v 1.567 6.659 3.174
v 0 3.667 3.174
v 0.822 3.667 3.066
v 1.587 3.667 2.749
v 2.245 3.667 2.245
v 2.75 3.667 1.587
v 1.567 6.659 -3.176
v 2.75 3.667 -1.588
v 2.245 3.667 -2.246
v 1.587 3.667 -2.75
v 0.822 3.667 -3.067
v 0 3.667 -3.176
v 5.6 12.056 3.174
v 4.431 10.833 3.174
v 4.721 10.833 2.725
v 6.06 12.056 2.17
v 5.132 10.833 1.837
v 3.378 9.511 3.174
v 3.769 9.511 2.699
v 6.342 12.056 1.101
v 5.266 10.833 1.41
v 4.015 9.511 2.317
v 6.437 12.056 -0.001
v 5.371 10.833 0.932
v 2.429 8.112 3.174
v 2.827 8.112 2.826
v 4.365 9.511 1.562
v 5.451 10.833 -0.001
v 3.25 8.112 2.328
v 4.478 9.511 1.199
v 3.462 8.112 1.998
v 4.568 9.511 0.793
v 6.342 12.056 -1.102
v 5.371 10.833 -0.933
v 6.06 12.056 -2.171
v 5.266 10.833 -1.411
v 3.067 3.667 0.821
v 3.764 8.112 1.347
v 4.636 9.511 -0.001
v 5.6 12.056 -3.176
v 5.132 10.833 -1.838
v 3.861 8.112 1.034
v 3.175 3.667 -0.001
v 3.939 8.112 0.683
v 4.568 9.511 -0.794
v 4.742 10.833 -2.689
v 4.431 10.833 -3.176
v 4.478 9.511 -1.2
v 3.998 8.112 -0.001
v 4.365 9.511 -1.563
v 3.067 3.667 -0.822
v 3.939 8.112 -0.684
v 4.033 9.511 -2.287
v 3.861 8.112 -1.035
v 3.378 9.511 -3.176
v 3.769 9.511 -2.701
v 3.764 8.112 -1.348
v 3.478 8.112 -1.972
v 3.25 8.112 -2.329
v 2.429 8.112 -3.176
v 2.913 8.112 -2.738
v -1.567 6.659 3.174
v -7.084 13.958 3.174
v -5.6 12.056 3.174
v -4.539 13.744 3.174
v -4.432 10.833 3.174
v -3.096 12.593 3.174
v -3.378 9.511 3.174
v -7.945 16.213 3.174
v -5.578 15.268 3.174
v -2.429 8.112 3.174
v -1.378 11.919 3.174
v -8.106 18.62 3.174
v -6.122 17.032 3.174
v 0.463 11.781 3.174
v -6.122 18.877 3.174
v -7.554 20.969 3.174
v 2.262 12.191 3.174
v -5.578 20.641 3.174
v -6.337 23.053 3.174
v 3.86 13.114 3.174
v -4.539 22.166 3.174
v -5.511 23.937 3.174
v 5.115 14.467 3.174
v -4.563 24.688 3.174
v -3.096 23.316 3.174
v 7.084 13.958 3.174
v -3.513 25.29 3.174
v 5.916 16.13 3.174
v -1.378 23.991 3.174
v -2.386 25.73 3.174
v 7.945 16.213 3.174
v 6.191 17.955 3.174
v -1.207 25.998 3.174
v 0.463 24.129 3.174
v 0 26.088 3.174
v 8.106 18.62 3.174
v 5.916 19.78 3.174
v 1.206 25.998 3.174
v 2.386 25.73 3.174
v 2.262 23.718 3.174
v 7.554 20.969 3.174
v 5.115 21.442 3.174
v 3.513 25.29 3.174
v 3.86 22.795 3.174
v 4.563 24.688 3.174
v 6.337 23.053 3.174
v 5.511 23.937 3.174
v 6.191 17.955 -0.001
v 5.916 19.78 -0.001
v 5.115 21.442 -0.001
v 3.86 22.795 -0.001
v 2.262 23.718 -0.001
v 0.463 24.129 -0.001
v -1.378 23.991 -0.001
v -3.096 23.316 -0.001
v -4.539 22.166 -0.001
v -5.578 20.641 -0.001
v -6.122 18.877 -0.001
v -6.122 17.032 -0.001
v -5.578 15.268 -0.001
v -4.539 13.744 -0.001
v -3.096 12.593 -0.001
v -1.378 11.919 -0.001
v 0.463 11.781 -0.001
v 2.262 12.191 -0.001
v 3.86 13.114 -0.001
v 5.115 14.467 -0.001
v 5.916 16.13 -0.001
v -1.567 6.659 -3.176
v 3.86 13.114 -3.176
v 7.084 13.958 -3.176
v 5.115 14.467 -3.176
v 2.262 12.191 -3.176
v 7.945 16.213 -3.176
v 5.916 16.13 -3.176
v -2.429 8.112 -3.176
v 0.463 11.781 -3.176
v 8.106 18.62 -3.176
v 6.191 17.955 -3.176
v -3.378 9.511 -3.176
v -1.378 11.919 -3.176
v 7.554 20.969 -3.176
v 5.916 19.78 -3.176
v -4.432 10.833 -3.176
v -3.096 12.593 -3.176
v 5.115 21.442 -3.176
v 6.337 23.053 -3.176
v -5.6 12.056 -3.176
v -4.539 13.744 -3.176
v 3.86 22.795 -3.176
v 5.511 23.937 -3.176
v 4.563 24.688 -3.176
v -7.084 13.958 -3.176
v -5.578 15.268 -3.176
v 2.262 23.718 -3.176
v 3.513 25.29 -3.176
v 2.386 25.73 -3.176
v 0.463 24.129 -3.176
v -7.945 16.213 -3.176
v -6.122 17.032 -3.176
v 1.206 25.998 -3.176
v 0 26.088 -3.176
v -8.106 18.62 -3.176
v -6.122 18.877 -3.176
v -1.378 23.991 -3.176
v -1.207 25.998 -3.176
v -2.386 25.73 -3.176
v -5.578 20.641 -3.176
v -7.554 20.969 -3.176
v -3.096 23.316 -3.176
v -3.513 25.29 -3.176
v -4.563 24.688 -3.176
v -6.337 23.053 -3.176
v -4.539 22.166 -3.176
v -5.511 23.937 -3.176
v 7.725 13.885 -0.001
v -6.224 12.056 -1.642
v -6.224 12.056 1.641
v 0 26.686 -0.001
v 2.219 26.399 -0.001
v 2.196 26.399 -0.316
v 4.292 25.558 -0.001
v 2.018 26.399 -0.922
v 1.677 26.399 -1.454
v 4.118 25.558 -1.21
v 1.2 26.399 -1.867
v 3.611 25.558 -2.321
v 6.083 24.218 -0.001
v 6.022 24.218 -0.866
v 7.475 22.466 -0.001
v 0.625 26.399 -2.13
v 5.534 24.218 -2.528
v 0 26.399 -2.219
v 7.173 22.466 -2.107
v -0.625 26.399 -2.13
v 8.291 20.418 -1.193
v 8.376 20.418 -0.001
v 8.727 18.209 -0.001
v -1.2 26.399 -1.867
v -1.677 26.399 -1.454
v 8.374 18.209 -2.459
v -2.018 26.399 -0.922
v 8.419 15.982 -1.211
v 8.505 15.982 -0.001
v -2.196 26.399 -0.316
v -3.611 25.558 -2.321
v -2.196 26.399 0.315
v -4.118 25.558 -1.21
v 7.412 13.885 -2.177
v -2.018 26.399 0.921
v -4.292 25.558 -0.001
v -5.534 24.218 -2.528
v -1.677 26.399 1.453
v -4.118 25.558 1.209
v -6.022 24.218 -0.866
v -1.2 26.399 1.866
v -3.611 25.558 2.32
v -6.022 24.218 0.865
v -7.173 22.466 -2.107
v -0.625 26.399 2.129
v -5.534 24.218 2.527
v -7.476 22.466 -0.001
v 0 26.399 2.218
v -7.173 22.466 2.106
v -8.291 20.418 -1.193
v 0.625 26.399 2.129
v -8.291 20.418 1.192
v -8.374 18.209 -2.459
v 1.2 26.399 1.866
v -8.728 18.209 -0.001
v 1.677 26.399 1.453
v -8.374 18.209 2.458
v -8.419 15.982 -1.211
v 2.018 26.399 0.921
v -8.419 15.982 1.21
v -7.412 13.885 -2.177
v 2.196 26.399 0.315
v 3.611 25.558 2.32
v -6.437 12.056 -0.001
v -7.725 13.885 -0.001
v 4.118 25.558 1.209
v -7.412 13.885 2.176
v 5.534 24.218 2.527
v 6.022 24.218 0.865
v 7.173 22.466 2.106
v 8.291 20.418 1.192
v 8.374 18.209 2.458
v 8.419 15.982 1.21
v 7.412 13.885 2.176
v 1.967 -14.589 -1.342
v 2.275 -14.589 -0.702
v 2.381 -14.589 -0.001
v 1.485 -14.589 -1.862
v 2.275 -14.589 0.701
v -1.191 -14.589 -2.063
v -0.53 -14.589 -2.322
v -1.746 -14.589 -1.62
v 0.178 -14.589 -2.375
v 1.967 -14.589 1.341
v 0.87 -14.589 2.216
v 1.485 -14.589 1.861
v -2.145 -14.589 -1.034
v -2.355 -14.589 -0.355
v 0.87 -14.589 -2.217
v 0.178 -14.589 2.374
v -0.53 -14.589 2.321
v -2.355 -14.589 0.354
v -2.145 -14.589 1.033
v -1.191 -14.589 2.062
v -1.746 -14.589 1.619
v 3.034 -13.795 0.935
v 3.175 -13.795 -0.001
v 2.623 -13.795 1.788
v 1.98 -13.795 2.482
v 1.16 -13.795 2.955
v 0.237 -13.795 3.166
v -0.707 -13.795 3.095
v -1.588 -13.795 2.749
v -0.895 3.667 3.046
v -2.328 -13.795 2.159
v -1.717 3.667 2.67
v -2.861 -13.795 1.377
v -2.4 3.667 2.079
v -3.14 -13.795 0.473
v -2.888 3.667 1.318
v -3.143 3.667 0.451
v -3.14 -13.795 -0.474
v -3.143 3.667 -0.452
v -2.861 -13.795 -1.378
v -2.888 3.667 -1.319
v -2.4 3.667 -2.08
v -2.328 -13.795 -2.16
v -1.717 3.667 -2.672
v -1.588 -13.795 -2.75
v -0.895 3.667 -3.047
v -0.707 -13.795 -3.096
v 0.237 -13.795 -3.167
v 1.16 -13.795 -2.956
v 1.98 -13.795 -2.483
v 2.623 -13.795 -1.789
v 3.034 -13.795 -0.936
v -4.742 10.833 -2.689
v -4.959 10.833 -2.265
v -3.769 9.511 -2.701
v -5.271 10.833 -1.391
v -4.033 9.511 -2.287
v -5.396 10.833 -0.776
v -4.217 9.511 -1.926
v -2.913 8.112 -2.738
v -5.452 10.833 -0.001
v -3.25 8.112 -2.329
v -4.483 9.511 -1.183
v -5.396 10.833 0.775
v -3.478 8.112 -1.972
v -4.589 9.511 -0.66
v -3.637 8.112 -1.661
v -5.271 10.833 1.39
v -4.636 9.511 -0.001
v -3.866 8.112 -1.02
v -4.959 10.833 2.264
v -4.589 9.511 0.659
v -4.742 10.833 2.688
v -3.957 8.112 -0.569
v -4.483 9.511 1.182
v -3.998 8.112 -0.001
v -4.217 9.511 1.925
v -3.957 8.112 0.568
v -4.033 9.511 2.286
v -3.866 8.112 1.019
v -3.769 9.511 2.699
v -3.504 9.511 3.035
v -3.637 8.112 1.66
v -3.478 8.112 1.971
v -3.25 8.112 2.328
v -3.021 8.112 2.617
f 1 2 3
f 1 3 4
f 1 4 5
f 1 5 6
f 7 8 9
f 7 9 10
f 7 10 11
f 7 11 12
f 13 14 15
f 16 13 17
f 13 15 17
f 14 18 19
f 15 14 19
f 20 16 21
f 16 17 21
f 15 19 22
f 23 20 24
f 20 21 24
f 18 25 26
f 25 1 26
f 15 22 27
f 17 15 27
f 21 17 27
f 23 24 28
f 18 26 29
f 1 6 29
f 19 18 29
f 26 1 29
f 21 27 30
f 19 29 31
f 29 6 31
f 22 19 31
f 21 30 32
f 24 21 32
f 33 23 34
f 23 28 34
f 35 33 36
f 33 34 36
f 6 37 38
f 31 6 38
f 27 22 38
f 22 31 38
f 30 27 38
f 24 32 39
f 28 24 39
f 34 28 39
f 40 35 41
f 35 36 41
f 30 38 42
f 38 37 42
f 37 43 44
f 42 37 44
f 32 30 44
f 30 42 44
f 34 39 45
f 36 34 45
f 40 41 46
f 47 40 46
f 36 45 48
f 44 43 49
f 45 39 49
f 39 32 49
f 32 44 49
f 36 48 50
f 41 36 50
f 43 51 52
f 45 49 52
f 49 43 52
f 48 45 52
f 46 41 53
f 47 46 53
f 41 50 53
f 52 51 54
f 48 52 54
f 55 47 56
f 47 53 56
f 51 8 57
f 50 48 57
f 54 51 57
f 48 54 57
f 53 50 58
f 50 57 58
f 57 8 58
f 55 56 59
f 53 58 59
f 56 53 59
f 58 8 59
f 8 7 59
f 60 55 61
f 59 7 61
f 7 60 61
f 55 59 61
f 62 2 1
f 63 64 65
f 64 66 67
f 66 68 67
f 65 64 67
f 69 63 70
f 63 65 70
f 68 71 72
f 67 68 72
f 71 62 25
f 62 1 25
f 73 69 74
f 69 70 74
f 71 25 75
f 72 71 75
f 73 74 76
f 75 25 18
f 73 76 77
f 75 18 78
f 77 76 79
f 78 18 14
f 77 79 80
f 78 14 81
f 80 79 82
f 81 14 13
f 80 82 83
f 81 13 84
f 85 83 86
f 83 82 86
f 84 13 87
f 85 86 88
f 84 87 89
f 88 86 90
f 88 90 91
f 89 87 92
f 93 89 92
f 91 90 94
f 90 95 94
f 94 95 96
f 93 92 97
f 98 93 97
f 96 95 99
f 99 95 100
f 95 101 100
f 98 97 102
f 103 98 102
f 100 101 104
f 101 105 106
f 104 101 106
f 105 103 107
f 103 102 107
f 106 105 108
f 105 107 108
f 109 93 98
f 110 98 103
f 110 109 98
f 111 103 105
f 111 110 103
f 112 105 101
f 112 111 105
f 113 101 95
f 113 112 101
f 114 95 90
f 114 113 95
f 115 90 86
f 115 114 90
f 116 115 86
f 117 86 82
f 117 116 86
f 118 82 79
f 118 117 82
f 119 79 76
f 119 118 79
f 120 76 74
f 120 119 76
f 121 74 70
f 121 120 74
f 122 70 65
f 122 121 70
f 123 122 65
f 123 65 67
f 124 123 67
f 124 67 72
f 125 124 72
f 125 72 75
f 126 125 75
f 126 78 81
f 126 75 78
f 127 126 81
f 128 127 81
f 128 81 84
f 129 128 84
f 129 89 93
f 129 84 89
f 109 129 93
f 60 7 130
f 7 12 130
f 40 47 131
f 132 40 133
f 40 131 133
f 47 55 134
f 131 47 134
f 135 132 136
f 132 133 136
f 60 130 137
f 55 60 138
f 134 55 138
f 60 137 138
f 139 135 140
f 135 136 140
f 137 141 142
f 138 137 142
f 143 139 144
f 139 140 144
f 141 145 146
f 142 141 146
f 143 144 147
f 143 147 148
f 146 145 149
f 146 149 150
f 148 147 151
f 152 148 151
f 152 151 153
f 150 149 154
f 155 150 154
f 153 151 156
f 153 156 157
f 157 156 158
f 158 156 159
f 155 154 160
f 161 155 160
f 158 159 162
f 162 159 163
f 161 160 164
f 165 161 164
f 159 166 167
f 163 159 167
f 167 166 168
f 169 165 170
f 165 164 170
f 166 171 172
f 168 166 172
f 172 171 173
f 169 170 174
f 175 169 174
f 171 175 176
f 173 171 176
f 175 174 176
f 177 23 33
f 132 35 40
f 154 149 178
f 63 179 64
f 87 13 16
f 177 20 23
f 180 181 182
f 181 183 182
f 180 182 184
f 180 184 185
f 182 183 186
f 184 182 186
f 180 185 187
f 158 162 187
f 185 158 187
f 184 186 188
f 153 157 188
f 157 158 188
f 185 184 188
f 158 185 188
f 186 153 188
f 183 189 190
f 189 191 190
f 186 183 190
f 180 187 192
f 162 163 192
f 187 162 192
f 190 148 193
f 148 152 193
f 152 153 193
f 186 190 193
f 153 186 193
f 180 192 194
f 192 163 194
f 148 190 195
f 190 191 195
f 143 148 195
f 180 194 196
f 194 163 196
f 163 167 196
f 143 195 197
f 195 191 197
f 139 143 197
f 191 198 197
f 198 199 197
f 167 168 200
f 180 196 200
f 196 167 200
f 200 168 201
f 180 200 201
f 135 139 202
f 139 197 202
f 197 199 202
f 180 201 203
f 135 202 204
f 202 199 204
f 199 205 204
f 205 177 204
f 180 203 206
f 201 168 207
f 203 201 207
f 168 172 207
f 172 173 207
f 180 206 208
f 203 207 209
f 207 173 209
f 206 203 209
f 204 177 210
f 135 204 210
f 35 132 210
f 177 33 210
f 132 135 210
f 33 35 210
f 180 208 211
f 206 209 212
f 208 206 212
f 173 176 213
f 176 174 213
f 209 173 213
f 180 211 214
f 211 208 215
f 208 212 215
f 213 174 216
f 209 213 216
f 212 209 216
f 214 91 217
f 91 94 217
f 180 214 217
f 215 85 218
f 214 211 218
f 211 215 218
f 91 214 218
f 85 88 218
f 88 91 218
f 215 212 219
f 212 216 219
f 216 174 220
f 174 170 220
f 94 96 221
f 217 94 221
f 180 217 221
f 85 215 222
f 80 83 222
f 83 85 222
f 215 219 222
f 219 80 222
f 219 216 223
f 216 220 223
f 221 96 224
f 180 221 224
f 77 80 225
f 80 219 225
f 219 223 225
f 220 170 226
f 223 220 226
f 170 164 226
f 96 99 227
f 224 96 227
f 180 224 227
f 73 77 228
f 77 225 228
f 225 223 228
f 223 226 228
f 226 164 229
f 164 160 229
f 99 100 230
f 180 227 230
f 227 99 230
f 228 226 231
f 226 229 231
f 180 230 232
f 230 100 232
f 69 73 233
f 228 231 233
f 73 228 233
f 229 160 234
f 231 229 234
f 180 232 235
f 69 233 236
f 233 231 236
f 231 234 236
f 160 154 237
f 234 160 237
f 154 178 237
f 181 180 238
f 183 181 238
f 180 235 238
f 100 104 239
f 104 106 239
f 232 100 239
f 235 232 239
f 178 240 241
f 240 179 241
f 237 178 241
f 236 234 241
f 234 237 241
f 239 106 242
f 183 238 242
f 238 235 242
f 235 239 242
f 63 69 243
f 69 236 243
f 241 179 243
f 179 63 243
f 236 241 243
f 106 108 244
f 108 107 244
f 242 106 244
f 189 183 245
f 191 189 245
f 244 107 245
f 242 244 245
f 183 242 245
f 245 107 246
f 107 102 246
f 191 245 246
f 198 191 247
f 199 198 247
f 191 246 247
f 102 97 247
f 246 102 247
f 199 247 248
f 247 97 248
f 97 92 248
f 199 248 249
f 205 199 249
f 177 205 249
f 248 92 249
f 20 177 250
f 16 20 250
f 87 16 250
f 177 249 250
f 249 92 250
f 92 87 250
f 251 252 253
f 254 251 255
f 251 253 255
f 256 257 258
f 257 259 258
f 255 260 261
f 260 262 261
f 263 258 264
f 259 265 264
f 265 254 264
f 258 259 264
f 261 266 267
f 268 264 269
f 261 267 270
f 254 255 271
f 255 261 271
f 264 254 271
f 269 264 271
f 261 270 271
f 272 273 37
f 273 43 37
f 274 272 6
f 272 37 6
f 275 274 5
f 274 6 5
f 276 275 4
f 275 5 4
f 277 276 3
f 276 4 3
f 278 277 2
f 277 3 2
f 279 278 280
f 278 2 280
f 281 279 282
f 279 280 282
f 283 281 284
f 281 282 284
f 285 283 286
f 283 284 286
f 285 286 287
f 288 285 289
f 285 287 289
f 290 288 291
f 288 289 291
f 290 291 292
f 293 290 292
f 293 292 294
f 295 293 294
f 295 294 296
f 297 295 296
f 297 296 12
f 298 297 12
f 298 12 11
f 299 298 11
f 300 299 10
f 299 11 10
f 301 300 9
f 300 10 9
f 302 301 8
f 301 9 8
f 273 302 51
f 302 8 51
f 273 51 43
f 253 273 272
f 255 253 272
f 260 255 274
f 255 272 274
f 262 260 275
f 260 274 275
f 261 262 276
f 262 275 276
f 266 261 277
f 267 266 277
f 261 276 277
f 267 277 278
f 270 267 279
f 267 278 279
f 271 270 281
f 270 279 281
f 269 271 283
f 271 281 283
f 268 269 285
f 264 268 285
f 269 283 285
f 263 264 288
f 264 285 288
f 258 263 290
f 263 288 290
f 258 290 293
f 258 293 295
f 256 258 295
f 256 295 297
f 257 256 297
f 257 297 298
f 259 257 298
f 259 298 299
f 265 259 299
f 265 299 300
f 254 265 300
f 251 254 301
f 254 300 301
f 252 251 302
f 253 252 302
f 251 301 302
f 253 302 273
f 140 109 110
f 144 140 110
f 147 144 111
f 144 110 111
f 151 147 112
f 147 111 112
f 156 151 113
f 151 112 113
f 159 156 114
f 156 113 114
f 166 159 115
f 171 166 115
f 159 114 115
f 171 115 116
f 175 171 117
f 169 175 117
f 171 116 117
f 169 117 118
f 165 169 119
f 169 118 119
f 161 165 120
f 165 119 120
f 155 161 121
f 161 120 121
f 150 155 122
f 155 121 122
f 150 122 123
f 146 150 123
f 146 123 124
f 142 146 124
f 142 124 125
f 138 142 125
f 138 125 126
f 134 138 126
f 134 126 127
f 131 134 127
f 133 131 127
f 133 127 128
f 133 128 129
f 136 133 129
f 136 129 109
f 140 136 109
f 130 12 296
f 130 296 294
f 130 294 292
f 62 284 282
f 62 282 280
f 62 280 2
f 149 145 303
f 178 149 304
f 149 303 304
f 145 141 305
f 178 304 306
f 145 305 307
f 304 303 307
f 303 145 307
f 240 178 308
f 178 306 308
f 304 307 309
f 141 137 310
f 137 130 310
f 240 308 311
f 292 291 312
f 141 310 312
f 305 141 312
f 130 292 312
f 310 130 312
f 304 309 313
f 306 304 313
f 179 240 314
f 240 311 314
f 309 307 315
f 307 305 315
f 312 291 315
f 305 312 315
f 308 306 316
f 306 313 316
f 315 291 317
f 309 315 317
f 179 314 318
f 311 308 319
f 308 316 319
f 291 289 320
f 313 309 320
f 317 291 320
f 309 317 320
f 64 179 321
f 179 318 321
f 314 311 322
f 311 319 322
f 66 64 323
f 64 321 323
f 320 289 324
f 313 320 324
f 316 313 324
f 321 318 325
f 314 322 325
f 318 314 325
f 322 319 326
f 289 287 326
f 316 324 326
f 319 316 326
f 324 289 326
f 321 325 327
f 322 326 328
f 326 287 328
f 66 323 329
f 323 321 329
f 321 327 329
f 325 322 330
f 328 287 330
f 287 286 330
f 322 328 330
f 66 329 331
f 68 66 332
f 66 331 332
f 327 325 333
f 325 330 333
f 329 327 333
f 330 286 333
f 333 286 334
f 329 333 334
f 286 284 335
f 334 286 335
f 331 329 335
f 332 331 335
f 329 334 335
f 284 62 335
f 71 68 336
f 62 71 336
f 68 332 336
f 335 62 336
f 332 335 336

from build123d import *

# Parameters (mm, degrees)
SKETCH1_W               = 6.35
SKETCH1_H               = 36.5125
CHAMFER2_SIZE           = 1.5875
SKETCH5_W               = 11.1125
SKETCH5_H               = 46.0375
CUT_EXTRUDE1_DEPTH      = 18.4625
CUT_EXTRUDE1_DEPTH_BACK = 18.4625
SKETCH6_R               = 12.3825
CUT_EXTRUDE2_DEPTH      = 7.3500001
CUT_EXTRUDE2_DEPTH_BACK = 7.3500001
SCALE1_SCALE            = 0.75
SCALE2_SCALE            = 0.666666667


with BuildPart() as part:
    # Sketch1 → Revolve1 (revolve)
    with BuildSketch(Plane.XY):
        with Locations((3.175, -18.25625)):
            Rectangle(SKETCH1_W, SKETCH1_H)
    revolve(axis=Axis((0, 46.0375, 0), (0, -1, 0)))

    # Chamfer2
    chamfer2_edges = [part.edges().sort_by_distance(p)[0] for p in [
        (-6.35, -36.5125, 0),
    ]]
    chamfer(chamfer2_edges, length=CHAMFER2_SIZE)

    # Sketch4 → Revolve2 (revolve)
    with BuildSketch(Plane.XY):
        with BuildLine():
            Line((6.35, 0), (0, 0))
            Line((0, 0), (0, 46.0375))
            ThreePointArc((0, 46.0375), (15.983688754, 35.607823052), (12.874497319, 16.77727882))
            ThreePointArc((12.874497319, 16.77727882), (8.03853042, 9.000640948), (6.35, 0))
        make_face()
    revolve(axis=Axis((0, 46.0375, 0), (0, 1, 0)))

    # Sketch5 → Cut-Extrude1 (cut, two sides)
    with BuildSketch(Plane(origin=(0, 0, 0), x_dir=(0, 0, -1), z_dir=(1, 0, 0))) as cut_extrude1_sk:
        with Locations((11.90625, 23.01875)):
            Rectangle(SKETCH5_W, SKETCH5_H)
        with Locations((-11.90625, 23.01875)):
            Rectangle(SKETCH5_W, SKETCH5_H)
    extrude(amount=CUT_EXTRUDE1_DEPTH, mode=Mode.SUBTRACT)
    extrude(cut_extrude1_sk.sketch, amount=-CUT_EXTRUDE1_DEPTH_BACK, mode=Mode.SUBTRACT)

    # Sketch6 → Cut-Extrude2 (cut, two sides)
    with BuildSketch(Plane.XY) as cut_extrude2_sk:
        with Locations((0, 28.575)):
            Circle(SKETCH6_R)
    extrude(amount=CUT_EXTRUDE2_DEPTH, mode=Mode.SUBTRACT)
    extrude(cut_extrude2_sk.sketch, amount=-CUT_EXTRUDE2_DEPTH_BACK, mode=Mode.SUBTRACT)


with BuildPart() as part_1:
    # Scale1: scaled about (-0.000122935, 7.334416679, -0.001044289)
    add(part.part.scale(SCALE1_SCALE).moved(Location((-3.0734e-05, 1.83360417, -0.000261072))))


with BuildPart() as part_2:
    # Scale2: scaled about (-0.000122935, 7.334416679, -0.001044289)
    add(part_1.part.scale(SCALE2_SCALE).moved(Location((-4.0978e-05, 2.44480556, -0.000348096))))


solid = part_2.part
